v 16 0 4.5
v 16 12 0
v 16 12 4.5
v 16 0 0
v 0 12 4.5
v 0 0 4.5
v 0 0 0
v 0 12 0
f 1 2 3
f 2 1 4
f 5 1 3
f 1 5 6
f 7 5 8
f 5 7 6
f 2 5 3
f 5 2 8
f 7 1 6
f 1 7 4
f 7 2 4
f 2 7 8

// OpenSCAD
// all dimensions in millimeters [in]
// includes matresses and accesories

// parameters
width_outer = 16;
length_outer = 12;
height_outer = 4.5;
body_top = [
  width_outer,
  length_outer,
  height_outer/2
];
body_bottom = [
  width_outer,
  length_outer,
  height_outer/2
];

// rough model
module body() {
  union() {
    translate([0, 0, height_outer/2]) color("DarkCyan") cube(size=body_top, center=false);
    color("Grey") cube(size=body_bottom, center=false);
    }
  }

// render
body();
